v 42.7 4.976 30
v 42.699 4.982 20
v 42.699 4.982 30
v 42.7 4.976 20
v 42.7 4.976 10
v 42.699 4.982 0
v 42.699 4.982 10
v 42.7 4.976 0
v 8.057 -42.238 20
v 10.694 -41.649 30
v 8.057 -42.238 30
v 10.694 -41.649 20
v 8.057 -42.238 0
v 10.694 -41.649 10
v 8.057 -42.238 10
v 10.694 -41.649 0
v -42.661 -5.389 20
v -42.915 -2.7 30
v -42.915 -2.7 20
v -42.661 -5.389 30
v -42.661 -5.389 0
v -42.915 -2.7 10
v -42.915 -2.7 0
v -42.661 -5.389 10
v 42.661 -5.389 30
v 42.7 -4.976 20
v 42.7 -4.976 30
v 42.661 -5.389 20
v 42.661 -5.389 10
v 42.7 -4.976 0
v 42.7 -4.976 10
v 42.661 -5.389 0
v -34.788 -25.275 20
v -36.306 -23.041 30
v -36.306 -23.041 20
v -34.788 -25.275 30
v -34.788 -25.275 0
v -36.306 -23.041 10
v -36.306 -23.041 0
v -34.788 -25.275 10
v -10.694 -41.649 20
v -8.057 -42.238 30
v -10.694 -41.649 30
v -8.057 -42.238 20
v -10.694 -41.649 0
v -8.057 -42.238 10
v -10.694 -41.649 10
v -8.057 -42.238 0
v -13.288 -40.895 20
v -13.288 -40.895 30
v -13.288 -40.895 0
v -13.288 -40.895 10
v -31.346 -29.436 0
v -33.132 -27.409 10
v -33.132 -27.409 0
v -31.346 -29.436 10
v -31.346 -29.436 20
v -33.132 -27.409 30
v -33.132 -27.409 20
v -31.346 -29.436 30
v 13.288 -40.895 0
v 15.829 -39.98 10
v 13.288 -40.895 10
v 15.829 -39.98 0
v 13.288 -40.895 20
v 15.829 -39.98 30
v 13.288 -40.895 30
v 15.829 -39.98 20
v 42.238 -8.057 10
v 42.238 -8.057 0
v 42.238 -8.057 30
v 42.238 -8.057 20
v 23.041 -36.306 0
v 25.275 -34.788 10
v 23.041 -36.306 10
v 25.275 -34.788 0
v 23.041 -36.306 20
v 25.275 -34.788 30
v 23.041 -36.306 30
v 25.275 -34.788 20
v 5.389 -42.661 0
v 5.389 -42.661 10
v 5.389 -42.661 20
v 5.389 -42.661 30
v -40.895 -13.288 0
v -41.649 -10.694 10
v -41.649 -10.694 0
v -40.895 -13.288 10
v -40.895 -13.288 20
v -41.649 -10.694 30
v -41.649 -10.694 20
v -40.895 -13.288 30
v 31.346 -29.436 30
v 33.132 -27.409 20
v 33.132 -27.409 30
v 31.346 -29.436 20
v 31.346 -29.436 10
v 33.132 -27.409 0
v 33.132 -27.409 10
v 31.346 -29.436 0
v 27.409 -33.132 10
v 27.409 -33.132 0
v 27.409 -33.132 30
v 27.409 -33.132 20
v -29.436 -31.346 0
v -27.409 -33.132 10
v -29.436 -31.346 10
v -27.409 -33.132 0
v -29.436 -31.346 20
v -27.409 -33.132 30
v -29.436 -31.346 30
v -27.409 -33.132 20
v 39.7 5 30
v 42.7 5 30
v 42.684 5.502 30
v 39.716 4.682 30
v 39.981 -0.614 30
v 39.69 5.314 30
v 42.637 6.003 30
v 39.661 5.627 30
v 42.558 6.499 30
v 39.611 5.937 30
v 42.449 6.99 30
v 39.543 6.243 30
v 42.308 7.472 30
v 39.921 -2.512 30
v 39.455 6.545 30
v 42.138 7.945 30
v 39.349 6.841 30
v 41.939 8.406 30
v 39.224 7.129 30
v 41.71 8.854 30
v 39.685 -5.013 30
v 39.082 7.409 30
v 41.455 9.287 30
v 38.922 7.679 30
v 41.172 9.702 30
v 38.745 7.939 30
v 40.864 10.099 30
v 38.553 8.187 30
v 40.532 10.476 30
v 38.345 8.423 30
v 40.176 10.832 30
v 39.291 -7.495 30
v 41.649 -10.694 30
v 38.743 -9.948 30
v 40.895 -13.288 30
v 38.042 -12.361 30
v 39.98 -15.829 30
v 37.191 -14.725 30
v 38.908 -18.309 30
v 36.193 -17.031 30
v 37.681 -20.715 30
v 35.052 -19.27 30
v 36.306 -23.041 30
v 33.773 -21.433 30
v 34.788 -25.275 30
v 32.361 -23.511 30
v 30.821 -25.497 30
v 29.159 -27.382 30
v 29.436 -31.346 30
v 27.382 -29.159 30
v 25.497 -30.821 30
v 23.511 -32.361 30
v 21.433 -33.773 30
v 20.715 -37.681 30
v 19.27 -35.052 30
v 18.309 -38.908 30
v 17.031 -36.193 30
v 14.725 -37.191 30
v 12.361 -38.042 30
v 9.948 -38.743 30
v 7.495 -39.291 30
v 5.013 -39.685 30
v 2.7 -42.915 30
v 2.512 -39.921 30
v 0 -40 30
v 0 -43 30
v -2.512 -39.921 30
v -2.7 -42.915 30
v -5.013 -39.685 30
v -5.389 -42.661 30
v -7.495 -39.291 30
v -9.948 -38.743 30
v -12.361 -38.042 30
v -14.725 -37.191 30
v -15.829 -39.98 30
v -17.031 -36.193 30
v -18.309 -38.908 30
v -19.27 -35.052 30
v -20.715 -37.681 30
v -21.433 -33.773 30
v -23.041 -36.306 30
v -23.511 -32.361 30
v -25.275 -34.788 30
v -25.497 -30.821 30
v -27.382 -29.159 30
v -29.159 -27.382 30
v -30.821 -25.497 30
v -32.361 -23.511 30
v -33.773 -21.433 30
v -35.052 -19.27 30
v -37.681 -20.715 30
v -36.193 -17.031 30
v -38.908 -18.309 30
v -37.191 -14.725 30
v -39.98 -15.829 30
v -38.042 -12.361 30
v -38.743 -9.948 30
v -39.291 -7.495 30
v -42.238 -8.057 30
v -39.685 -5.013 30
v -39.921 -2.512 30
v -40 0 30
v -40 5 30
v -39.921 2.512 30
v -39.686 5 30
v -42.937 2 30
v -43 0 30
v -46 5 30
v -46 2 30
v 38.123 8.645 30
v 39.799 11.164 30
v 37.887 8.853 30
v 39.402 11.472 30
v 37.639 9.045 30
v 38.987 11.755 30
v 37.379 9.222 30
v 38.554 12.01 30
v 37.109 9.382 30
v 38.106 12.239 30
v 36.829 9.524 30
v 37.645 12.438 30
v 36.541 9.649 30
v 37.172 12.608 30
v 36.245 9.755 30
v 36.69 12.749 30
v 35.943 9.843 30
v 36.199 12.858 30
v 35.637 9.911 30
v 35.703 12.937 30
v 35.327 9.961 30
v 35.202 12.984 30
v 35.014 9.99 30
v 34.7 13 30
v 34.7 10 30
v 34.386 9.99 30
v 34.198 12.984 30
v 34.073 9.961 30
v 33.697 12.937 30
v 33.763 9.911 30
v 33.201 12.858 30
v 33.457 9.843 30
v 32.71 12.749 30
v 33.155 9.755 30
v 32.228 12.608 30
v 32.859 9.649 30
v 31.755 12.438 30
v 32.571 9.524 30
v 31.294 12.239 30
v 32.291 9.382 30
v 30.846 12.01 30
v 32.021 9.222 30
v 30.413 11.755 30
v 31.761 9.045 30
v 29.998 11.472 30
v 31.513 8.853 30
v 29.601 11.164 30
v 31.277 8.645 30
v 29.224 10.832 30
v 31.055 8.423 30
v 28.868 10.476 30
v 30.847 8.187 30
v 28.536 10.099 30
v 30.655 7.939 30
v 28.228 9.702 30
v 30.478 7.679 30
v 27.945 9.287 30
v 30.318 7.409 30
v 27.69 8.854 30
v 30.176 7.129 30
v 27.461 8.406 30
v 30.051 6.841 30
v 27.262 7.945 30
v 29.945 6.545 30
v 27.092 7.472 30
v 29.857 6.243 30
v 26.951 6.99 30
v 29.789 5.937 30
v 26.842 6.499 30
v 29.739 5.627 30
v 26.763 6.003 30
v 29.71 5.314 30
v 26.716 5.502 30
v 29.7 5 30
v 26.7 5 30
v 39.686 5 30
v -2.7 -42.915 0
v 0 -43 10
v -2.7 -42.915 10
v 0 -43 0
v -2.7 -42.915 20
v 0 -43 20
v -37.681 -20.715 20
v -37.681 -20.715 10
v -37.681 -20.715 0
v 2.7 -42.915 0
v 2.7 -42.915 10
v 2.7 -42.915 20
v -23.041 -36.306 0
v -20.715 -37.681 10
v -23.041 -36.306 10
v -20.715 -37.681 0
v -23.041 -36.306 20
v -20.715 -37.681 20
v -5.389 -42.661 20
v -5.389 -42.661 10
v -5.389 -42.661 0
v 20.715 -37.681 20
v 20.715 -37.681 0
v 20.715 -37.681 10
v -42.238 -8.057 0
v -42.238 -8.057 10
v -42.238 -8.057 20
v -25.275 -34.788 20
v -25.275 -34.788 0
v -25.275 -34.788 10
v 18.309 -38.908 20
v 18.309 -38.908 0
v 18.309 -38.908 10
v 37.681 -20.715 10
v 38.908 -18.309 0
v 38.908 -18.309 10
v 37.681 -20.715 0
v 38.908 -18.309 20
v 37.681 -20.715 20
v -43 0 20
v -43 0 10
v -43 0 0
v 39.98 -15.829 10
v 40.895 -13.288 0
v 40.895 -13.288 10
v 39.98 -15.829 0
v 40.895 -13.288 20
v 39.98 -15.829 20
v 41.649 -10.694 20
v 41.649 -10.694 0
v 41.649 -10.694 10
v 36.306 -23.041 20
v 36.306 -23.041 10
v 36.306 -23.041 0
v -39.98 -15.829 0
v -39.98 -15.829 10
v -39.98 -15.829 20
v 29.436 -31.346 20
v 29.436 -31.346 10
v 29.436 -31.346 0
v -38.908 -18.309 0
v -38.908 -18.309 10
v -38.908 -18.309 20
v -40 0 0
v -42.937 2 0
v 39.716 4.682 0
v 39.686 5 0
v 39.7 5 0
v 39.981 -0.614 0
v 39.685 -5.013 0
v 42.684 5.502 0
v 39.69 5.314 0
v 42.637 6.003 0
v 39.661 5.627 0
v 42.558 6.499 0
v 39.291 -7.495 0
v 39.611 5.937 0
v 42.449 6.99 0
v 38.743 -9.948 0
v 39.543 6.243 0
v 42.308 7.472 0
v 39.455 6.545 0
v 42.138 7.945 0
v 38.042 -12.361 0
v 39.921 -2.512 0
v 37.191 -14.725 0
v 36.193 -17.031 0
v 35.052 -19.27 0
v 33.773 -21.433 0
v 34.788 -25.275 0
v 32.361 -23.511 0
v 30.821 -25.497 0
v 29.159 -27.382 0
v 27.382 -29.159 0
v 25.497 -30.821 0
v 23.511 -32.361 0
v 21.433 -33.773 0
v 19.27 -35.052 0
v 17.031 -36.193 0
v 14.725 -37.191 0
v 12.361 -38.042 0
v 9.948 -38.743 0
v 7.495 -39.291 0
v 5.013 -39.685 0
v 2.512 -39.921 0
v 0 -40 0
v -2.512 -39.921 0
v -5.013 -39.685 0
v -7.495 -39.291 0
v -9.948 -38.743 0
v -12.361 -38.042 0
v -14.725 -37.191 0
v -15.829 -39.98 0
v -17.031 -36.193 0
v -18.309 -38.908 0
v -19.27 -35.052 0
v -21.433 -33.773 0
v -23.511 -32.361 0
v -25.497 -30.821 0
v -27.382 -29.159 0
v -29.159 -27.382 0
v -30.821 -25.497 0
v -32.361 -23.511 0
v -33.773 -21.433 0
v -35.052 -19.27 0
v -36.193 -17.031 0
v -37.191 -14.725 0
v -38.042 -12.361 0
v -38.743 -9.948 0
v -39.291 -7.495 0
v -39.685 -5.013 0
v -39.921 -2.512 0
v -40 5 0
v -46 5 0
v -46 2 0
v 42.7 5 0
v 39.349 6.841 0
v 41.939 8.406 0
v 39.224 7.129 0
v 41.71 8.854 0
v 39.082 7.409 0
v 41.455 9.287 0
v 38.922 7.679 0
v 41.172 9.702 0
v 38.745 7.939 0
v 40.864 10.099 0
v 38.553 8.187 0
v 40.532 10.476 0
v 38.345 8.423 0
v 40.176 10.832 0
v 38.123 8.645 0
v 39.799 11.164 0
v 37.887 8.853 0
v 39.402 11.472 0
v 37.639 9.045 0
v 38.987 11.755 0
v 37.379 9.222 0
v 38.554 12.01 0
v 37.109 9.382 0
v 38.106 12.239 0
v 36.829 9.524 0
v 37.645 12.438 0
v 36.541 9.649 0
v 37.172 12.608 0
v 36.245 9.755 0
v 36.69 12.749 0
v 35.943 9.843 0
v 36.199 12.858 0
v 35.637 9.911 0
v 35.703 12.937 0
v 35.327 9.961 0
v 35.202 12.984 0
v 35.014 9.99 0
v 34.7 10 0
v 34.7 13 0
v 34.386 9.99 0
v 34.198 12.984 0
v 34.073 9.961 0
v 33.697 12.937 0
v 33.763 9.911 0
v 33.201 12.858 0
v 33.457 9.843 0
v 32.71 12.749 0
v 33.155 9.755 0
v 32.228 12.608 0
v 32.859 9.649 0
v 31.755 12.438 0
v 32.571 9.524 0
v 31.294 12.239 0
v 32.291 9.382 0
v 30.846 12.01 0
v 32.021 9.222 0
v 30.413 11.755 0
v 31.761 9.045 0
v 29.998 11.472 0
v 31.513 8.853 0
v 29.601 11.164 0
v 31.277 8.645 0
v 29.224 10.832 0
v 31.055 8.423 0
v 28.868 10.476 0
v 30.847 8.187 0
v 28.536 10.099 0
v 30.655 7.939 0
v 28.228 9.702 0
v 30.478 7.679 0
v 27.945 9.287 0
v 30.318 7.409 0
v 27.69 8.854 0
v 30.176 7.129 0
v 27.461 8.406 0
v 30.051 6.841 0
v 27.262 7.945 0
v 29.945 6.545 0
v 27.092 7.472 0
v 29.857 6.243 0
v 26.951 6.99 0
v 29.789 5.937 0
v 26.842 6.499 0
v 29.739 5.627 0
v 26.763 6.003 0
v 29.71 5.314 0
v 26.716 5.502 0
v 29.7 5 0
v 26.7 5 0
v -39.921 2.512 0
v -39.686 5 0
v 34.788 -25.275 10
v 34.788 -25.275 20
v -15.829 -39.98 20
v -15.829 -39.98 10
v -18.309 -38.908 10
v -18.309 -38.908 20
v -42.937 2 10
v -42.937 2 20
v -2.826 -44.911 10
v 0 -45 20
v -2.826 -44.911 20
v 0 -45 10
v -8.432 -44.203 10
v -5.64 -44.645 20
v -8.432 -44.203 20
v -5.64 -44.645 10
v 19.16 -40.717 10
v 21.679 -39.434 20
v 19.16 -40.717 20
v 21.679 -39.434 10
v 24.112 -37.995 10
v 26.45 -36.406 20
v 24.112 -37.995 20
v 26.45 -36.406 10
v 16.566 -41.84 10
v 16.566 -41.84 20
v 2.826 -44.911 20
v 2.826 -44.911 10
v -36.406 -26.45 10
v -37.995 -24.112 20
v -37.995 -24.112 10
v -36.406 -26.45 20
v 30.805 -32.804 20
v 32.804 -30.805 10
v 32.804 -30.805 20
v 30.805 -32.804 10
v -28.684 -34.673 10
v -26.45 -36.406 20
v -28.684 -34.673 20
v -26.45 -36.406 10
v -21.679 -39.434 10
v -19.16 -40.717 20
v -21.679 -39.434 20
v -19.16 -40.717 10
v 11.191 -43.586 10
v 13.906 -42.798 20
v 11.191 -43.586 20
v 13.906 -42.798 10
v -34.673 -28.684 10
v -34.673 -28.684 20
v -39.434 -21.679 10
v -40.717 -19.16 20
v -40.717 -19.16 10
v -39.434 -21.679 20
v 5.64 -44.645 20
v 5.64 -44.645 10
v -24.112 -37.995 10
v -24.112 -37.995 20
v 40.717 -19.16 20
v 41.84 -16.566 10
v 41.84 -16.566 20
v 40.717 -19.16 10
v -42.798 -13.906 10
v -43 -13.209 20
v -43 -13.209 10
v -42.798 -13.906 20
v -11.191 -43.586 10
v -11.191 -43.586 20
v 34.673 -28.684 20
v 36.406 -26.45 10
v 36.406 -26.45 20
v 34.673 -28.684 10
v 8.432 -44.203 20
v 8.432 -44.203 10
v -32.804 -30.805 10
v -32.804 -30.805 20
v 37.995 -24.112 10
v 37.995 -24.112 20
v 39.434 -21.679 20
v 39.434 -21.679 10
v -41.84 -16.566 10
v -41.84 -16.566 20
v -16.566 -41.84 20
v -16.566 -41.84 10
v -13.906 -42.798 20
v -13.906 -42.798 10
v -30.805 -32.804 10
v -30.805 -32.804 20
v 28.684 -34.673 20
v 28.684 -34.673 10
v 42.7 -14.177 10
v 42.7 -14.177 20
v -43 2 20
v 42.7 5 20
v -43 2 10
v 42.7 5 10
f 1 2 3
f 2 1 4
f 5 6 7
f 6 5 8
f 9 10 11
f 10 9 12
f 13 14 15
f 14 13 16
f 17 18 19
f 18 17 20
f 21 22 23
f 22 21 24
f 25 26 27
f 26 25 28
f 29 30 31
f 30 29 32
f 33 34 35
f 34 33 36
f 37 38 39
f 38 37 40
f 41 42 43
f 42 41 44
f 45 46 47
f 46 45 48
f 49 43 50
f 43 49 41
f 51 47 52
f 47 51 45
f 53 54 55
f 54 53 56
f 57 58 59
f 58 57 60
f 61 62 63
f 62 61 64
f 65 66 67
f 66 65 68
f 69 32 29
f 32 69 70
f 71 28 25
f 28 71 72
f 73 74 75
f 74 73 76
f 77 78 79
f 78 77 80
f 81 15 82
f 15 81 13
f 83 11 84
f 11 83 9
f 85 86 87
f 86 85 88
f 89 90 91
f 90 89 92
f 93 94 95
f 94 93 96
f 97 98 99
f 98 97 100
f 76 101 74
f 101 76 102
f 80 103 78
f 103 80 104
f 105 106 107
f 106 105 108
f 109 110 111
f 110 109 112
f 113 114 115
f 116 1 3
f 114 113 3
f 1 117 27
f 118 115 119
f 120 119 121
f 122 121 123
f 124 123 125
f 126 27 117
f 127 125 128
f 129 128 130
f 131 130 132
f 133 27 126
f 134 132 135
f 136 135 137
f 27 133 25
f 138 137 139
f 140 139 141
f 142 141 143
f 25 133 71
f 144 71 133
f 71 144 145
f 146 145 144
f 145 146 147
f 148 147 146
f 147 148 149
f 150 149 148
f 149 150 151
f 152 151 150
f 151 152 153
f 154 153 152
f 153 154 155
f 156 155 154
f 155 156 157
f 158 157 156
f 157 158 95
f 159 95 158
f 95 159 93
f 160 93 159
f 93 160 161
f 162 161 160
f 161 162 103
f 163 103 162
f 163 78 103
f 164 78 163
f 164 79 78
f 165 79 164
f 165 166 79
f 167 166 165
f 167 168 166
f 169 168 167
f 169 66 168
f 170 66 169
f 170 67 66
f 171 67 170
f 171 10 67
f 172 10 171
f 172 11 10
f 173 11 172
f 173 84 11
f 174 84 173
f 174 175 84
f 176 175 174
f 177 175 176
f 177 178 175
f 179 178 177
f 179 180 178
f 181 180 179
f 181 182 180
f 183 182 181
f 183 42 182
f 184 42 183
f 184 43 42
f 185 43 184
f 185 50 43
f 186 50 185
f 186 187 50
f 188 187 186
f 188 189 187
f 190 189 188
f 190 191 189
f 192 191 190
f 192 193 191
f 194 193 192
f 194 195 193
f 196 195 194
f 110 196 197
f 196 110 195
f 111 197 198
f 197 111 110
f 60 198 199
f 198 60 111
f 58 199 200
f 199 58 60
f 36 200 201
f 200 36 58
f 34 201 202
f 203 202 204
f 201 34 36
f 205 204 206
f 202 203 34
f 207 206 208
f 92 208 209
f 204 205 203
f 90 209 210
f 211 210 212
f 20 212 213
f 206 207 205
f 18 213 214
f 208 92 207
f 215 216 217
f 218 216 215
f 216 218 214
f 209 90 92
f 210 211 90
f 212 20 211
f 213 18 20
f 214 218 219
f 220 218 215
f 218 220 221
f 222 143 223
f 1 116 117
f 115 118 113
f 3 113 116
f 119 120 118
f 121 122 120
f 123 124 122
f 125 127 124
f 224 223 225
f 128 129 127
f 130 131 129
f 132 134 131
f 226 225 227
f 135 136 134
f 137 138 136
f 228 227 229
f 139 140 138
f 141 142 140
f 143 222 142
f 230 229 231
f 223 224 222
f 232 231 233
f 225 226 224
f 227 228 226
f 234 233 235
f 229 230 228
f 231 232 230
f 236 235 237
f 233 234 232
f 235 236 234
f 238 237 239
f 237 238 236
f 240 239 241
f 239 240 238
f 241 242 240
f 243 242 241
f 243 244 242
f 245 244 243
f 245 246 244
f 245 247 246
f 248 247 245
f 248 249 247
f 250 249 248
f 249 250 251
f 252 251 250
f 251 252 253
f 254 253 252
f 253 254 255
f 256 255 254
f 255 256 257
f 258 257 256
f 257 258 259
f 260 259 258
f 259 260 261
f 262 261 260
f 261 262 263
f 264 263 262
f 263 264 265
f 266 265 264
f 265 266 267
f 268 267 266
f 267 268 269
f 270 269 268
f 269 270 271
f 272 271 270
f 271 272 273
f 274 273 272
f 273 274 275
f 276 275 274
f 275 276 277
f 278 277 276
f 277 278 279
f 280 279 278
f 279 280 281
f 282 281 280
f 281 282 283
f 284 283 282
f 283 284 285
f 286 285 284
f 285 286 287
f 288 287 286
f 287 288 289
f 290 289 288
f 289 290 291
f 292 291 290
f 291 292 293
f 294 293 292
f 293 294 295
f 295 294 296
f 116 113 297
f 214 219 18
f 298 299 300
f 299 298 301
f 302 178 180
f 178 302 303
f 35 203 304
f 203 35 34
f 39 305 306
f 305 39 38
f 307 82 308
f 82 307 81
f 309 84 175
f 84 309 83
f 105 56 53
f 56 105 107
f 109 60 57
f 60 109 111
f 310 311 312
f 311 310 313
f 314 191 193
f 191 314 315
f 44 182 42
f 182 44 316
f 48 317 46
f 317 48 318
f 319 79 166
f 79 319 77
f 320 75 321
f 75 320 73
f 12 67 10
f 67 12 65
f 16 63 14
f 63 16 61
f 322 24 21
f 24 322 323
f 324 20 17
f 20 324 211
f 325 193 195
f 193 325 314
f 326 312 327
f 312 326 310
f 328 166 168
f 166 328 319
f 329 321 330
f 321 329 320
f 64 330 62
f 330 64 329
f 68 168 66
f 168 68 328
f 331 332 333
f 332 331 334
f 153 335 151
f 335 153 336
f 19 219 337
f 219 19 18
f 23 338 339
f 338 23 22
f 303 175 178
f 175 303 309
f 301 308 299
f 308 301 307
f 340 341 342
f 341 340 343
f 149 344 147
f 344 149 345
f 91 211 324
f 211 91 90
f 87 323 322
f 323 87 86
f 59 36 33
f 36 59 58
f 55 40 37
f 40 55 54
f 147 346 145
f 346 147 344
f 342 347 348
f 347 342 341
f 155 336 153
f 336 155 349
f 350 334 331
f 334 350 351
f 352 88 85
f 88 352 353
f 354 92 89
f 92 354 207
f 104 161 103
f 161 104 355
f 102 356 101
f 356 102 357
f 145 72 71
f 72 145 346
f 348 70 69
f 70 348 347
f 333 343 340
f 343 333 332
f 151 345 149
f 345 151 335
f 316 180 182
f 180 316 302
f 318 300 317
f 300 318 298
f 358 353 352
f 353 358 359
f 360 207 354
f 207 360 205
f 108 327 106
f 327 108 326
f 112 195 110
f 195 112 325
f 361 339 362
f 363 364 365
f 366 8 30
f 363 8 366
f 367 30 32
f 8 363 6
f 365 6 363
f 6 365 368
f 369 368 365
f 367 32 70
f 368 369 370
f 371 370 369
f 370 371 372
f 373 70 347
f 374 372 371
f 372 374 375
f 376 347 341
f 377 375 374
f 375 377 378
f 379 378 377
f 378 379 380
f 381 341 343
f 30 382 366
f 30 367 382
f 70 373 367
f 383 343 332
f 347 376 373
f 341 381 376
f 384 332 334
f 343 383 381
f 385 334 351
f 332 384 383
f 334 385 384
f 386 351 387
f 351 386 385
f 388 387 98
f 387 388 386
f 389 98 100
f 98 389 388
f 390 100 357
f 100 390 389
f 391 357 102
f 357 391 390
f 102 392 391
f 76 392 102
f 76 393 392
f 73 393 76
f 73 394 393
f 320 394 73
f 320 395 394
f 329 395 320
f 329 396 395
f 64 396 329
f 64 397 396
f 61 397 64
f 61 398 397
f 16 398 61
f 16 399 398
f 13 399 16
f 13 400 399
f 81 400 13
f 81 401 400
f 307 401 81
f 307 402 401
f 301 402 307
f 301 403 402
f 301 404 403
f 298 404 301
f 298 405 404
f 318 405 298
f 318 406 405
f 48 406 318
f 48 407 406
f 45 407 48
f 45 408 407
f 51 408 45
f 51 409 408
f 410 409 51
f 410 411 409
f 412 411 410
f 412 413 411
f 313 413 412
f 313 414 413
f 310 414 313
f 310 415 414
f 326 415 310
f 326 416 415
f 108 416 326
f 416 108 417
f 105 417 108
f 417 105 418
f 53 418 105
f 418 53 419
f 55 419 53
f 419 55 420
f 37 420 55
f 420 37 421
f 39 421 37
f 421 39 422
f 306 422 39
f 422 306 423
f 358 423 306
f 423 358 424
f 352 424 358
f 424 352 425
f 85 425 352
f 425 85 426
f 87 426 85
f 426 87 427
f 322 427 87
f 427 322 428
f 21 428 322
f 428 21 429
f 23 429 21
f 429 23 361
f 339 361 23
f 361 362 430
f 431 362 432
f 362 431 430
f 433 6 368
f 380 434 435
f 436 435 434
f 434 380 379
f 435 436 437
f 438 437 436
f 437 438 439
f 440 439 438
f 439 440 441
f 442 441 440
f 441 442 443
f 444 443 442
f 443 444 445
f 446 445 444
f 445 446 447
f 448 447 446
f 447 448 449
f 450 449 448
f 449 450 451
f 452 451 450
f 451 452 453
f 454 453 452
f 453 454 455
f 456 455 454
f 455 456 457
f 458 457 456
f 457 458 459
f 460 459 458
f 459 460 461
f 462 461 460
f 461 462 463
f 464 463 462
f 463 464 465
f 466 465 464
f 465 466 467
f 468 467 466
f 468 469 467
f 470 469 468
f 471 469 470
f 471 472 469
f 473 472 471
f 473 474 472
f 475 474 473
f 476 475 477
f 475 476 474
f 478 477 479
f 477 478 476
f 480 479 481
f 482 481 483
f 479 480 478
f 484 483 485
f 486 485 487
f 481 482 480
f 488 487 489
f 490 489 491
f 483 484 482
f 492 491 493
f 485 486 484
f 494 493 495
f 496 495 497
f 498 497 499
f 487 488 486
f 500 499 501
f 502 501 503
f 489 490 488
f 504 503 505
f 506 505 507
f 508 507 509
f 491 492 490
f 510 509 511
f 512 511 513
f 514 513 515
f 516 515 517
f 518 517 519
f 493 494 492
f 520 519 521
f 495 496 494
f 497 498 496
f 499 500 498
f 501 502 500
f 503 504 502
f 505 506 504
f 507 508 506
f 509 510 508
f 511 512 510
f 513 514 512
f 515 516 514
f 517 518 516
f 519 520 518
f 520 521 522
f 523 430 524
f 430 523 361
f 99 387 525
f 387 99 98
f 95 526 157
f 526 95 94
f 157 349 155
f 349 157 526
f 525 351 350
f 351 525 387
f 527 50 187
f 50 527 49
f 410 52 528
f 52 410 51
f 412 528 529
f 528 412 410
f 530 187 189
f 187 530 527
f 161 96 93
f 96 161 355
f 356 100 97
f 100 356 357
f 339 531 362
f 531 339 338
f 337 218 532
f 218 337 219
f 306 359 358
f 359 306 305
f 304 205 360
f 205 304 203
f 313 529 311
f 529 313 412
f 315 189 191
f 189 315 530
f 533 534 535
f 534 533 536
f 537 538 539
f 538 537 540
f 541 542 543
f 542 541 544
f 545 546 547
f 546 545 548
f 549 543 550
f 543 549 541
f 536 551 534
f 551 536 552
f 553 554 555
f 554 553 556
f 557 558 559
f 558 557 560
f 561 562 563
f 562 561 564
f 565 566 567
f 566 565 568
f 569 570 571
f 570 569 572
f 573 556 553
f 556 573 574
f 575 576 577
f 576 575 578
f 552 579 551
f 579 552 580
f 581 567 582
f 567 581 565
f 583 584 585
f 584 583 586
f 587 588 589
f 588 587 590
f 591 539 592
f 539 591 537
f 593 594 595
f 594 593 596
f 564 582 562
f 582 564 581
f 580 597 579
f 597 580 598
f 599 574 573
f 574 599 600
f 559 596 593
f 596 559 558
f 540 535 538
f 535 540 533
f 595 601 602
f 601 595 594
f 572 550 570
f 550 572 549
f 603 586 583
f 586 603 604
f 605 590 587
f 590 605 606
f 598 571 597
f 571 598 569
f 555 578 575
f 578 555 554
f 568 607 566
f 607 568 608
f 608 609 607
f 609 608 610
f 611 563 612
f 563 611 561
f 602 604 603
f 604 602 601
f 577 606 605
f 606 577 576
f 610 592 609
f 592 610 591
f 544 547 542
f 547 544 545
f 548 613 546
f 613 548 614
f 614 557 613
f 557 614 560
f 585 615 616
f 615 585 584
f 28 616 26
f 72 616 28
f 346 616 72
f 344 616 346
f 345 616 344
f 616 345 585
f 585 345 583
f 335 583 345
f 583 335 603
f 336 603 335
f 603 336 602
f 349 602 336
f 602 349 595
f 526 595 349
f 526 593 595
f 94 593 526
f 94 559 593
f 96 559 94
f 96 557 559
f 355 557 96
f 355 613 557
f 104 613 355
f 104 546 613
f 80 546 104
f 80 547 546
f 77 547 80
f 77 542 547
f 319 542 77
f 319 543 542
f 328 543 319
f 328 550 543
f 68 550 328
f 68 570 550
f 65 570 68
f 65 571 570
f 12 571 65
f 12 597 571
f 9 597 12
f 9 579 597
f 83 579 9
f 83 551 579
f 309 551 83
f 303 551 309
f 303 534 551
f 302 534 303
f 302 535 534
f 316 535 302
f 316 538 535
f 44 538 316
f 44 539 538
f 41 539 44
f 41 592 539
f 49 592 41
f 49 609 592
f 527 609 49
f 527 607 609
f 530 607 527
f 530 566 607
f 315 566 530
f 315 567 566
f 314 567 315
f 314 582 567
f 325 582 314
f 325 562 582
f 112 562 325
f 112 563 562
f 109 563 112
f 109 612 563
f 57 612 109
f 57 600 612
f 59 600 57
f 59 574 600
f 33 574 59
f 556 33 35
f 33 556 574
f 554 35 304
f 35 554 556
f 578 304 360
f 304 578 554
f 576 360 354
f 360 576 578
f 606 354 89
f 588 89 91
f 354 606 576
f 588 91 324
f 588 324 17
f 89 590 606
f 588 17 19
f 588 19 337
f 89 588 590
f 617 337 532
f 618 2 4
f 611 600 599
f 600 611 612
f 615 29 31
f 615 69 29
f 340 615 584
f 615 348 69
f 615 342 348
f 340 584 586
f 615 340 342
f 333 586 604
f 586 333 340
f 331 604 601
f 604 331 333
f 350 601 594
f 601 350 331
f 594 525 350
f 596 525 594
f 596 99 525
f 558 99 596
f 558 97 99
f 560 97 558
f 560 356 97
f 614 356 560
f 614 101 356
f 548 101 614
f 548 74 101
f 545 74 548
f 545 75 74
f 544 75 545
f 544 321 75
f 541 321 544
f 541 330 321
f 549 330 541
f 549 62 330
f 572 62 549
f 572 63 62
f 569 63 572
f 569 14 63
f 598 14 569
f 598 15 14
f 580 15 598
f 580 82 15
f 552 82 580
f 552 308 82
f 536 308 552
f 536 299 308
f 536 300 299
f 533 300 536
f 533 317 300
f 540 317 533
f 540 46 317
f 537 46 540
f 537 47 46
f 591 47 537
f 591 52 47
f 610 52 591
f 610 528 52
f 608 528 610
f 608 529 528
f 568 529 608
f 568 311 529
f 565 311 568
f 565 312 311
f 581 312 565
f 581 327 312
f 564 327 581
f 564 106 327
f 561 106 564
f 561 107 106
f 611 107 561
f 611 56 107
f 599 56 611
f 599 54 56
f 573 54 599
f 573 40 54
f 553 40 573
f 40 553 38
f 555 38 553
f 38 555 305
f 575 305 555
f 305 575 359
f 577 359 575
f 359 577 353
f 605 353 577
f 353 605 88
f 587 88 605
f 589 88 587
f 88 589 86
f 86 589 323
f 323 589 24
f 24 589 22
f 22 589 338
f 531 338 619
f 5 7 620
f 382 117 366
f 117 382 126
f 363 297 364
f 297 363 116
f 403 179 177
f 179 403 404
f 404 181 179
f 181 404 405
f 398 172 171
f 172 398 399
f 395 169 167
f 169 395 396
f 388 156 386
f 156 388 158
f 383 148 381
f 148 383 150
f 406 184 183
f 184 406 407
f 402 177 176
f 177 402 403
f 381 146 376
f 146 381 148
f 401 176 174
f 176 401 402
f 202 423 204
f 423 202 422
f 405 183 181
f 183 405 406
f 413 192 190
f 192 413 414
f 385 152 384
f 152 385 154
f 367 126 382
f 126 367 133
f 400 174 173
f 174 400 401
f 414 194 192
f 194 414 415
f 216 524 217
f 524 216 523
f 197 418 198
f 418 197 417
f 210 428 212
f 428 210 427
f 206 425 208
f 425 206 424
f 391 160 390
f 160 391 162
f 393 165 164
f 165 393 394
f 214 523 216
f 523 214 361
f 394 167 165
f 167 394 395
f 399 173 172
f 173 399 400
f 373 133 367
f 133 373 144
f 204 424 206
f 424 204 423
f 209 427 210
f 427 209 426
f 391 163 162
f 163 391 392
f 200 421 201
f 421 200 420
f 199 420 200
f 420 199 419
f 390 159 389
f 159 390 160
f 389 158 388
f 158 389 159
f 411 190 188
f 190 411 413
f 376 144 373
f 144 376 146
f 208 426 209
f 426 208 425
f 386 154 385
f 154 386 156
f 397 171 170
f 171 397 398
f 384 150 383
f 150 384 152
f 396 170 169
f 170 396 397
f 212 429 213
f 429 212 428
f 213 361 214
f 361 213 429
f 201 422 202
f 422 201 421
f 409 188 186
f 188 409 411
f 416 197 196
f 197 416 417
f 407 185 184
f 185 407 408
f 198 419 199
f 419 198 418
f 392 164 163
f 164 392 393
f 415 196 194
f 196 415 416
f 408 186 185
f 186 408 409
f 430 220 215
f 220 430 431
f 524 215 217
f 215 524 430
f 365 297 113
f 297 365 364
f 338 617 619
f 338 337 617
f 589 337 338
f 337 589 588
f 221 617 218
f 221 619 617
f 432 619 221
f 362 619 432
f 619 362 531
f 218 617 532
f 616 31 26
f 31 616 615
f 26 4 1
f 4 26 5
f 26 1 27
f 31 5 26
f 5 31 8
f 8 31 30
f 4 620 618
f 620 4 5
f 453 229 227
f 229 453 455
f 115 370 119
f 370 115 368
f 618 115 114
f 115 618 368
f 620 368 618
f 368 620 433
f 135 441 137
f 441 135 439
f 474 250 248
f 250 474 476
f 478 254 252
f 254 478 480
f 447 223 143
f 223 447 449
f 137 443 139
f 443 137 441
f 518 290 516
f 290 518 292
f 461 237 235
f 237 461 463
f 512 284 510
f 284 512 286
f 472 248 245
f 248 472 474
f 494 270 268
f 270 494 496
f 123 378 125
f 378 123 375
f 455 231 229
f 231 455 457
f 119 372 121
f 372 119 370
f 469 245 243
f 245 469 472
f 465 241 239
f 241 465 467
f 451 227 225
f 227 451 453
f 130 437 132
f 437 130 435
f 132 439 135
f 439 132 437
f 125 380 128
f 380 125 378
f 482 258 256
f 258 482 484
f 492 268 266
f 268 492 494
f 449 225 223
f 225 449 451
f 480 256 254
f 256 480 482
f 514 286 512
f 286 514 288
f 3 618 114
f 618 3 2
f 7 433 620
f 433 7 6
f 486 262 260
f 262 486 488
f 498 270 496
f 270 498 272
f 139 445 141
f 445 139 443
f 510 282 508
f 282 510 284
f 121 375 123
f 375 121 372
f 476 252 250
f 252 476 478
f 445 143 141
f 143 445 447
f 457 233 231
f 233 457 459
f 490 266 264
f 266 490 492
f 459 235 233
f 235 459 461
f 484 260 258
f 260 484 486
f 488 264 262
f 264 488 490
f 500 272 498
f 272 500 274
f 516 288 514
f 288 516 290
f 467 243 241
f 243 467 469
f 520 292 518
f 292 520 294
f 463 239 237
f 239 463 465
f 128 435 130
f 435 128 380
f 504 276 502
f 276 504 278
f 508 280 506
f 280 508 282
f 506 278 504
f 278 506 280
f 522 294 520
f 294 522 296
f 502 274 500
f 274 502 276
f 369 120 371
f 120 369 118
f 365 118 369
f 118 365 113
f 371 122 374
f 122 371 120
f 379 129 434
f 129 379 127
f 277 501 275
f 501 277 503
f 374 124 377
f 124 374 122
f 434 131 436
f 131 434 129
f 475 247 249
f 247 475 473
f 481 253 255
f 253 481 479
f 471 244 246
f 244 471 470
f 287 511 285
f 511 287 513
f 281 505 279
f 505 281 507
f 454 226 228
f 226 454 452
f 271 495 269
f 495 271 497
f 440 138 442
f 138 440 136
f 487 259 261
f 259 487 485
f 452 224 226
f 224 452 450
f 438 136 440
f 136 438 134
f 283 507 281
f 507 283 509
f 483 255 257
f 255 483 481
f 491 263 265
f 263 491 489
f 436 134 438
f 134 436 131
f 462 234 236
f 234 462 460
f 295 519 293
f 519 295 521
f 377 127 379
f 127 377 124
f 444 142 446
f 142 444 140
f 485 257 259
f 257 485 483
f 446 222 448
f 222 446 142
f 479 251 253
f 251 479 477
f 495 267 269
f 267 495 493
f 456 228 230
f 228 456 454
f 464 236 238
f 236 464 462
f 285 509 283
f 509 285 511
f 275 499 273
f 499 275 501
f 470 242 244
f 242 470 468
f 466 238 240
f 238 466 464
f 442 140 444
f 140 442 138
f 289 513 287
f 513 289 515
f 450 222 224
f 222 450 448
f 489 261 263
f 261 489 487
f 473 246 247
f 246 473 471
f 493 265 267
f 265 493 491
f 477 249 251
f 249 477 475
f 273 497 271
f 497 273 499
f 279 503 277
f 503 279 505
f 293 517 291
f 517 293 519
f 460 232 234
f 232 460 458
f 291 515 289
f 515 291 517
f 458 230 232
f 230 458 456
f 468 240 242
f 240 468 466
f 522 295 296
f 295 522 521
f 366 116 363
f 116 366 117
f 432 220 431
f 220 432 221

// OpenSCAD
$fn = 100;

difference() {

        union() {
            // Main body
            cylinder(h = 30, d=86);
            
            // Verstärkung
            color("cyan")
            translate([0, 0, 10])
            cylinder(h = 10, d=90);

        }

        // Aussparung für Dachrinne
        translate([0, 0, -1])
        cylinder(h = 32, d=80);

        // Halbieren
        color("cyan")
        translate([-46, 5, -1])
        cube([92, 45, 32]);

        // Verstärkung wegschneiden links
        color("red")
        translate([-48, -18, -1])
        cube([5, 20, 32]);

        // Verstärkung wegschneiden rechts
        color("pink")
        translate([42.7, -18, -1])
        cube([5, 25, 32]);

}

// Haken
translate([-46, 2, 0])
cube([6, 3, 30]);




// Rechter Haken
difference() {

        color("cyan")
        translate([34.7, 5, 0])
        cylinder(h = 30, d = 16);

        color("red")
        translate([34.7, 5, -1])
        cylinder(h = 32, d = 10);


        color("pink")
        translate([26.7, 5, -1])
        linear_extrude(height=32)
        polygon(points=[
        [0, 0],
        [0, -8],
        [13.0, -8],
        [13.3, -6],
        [13, 0]
        ]);        

}
